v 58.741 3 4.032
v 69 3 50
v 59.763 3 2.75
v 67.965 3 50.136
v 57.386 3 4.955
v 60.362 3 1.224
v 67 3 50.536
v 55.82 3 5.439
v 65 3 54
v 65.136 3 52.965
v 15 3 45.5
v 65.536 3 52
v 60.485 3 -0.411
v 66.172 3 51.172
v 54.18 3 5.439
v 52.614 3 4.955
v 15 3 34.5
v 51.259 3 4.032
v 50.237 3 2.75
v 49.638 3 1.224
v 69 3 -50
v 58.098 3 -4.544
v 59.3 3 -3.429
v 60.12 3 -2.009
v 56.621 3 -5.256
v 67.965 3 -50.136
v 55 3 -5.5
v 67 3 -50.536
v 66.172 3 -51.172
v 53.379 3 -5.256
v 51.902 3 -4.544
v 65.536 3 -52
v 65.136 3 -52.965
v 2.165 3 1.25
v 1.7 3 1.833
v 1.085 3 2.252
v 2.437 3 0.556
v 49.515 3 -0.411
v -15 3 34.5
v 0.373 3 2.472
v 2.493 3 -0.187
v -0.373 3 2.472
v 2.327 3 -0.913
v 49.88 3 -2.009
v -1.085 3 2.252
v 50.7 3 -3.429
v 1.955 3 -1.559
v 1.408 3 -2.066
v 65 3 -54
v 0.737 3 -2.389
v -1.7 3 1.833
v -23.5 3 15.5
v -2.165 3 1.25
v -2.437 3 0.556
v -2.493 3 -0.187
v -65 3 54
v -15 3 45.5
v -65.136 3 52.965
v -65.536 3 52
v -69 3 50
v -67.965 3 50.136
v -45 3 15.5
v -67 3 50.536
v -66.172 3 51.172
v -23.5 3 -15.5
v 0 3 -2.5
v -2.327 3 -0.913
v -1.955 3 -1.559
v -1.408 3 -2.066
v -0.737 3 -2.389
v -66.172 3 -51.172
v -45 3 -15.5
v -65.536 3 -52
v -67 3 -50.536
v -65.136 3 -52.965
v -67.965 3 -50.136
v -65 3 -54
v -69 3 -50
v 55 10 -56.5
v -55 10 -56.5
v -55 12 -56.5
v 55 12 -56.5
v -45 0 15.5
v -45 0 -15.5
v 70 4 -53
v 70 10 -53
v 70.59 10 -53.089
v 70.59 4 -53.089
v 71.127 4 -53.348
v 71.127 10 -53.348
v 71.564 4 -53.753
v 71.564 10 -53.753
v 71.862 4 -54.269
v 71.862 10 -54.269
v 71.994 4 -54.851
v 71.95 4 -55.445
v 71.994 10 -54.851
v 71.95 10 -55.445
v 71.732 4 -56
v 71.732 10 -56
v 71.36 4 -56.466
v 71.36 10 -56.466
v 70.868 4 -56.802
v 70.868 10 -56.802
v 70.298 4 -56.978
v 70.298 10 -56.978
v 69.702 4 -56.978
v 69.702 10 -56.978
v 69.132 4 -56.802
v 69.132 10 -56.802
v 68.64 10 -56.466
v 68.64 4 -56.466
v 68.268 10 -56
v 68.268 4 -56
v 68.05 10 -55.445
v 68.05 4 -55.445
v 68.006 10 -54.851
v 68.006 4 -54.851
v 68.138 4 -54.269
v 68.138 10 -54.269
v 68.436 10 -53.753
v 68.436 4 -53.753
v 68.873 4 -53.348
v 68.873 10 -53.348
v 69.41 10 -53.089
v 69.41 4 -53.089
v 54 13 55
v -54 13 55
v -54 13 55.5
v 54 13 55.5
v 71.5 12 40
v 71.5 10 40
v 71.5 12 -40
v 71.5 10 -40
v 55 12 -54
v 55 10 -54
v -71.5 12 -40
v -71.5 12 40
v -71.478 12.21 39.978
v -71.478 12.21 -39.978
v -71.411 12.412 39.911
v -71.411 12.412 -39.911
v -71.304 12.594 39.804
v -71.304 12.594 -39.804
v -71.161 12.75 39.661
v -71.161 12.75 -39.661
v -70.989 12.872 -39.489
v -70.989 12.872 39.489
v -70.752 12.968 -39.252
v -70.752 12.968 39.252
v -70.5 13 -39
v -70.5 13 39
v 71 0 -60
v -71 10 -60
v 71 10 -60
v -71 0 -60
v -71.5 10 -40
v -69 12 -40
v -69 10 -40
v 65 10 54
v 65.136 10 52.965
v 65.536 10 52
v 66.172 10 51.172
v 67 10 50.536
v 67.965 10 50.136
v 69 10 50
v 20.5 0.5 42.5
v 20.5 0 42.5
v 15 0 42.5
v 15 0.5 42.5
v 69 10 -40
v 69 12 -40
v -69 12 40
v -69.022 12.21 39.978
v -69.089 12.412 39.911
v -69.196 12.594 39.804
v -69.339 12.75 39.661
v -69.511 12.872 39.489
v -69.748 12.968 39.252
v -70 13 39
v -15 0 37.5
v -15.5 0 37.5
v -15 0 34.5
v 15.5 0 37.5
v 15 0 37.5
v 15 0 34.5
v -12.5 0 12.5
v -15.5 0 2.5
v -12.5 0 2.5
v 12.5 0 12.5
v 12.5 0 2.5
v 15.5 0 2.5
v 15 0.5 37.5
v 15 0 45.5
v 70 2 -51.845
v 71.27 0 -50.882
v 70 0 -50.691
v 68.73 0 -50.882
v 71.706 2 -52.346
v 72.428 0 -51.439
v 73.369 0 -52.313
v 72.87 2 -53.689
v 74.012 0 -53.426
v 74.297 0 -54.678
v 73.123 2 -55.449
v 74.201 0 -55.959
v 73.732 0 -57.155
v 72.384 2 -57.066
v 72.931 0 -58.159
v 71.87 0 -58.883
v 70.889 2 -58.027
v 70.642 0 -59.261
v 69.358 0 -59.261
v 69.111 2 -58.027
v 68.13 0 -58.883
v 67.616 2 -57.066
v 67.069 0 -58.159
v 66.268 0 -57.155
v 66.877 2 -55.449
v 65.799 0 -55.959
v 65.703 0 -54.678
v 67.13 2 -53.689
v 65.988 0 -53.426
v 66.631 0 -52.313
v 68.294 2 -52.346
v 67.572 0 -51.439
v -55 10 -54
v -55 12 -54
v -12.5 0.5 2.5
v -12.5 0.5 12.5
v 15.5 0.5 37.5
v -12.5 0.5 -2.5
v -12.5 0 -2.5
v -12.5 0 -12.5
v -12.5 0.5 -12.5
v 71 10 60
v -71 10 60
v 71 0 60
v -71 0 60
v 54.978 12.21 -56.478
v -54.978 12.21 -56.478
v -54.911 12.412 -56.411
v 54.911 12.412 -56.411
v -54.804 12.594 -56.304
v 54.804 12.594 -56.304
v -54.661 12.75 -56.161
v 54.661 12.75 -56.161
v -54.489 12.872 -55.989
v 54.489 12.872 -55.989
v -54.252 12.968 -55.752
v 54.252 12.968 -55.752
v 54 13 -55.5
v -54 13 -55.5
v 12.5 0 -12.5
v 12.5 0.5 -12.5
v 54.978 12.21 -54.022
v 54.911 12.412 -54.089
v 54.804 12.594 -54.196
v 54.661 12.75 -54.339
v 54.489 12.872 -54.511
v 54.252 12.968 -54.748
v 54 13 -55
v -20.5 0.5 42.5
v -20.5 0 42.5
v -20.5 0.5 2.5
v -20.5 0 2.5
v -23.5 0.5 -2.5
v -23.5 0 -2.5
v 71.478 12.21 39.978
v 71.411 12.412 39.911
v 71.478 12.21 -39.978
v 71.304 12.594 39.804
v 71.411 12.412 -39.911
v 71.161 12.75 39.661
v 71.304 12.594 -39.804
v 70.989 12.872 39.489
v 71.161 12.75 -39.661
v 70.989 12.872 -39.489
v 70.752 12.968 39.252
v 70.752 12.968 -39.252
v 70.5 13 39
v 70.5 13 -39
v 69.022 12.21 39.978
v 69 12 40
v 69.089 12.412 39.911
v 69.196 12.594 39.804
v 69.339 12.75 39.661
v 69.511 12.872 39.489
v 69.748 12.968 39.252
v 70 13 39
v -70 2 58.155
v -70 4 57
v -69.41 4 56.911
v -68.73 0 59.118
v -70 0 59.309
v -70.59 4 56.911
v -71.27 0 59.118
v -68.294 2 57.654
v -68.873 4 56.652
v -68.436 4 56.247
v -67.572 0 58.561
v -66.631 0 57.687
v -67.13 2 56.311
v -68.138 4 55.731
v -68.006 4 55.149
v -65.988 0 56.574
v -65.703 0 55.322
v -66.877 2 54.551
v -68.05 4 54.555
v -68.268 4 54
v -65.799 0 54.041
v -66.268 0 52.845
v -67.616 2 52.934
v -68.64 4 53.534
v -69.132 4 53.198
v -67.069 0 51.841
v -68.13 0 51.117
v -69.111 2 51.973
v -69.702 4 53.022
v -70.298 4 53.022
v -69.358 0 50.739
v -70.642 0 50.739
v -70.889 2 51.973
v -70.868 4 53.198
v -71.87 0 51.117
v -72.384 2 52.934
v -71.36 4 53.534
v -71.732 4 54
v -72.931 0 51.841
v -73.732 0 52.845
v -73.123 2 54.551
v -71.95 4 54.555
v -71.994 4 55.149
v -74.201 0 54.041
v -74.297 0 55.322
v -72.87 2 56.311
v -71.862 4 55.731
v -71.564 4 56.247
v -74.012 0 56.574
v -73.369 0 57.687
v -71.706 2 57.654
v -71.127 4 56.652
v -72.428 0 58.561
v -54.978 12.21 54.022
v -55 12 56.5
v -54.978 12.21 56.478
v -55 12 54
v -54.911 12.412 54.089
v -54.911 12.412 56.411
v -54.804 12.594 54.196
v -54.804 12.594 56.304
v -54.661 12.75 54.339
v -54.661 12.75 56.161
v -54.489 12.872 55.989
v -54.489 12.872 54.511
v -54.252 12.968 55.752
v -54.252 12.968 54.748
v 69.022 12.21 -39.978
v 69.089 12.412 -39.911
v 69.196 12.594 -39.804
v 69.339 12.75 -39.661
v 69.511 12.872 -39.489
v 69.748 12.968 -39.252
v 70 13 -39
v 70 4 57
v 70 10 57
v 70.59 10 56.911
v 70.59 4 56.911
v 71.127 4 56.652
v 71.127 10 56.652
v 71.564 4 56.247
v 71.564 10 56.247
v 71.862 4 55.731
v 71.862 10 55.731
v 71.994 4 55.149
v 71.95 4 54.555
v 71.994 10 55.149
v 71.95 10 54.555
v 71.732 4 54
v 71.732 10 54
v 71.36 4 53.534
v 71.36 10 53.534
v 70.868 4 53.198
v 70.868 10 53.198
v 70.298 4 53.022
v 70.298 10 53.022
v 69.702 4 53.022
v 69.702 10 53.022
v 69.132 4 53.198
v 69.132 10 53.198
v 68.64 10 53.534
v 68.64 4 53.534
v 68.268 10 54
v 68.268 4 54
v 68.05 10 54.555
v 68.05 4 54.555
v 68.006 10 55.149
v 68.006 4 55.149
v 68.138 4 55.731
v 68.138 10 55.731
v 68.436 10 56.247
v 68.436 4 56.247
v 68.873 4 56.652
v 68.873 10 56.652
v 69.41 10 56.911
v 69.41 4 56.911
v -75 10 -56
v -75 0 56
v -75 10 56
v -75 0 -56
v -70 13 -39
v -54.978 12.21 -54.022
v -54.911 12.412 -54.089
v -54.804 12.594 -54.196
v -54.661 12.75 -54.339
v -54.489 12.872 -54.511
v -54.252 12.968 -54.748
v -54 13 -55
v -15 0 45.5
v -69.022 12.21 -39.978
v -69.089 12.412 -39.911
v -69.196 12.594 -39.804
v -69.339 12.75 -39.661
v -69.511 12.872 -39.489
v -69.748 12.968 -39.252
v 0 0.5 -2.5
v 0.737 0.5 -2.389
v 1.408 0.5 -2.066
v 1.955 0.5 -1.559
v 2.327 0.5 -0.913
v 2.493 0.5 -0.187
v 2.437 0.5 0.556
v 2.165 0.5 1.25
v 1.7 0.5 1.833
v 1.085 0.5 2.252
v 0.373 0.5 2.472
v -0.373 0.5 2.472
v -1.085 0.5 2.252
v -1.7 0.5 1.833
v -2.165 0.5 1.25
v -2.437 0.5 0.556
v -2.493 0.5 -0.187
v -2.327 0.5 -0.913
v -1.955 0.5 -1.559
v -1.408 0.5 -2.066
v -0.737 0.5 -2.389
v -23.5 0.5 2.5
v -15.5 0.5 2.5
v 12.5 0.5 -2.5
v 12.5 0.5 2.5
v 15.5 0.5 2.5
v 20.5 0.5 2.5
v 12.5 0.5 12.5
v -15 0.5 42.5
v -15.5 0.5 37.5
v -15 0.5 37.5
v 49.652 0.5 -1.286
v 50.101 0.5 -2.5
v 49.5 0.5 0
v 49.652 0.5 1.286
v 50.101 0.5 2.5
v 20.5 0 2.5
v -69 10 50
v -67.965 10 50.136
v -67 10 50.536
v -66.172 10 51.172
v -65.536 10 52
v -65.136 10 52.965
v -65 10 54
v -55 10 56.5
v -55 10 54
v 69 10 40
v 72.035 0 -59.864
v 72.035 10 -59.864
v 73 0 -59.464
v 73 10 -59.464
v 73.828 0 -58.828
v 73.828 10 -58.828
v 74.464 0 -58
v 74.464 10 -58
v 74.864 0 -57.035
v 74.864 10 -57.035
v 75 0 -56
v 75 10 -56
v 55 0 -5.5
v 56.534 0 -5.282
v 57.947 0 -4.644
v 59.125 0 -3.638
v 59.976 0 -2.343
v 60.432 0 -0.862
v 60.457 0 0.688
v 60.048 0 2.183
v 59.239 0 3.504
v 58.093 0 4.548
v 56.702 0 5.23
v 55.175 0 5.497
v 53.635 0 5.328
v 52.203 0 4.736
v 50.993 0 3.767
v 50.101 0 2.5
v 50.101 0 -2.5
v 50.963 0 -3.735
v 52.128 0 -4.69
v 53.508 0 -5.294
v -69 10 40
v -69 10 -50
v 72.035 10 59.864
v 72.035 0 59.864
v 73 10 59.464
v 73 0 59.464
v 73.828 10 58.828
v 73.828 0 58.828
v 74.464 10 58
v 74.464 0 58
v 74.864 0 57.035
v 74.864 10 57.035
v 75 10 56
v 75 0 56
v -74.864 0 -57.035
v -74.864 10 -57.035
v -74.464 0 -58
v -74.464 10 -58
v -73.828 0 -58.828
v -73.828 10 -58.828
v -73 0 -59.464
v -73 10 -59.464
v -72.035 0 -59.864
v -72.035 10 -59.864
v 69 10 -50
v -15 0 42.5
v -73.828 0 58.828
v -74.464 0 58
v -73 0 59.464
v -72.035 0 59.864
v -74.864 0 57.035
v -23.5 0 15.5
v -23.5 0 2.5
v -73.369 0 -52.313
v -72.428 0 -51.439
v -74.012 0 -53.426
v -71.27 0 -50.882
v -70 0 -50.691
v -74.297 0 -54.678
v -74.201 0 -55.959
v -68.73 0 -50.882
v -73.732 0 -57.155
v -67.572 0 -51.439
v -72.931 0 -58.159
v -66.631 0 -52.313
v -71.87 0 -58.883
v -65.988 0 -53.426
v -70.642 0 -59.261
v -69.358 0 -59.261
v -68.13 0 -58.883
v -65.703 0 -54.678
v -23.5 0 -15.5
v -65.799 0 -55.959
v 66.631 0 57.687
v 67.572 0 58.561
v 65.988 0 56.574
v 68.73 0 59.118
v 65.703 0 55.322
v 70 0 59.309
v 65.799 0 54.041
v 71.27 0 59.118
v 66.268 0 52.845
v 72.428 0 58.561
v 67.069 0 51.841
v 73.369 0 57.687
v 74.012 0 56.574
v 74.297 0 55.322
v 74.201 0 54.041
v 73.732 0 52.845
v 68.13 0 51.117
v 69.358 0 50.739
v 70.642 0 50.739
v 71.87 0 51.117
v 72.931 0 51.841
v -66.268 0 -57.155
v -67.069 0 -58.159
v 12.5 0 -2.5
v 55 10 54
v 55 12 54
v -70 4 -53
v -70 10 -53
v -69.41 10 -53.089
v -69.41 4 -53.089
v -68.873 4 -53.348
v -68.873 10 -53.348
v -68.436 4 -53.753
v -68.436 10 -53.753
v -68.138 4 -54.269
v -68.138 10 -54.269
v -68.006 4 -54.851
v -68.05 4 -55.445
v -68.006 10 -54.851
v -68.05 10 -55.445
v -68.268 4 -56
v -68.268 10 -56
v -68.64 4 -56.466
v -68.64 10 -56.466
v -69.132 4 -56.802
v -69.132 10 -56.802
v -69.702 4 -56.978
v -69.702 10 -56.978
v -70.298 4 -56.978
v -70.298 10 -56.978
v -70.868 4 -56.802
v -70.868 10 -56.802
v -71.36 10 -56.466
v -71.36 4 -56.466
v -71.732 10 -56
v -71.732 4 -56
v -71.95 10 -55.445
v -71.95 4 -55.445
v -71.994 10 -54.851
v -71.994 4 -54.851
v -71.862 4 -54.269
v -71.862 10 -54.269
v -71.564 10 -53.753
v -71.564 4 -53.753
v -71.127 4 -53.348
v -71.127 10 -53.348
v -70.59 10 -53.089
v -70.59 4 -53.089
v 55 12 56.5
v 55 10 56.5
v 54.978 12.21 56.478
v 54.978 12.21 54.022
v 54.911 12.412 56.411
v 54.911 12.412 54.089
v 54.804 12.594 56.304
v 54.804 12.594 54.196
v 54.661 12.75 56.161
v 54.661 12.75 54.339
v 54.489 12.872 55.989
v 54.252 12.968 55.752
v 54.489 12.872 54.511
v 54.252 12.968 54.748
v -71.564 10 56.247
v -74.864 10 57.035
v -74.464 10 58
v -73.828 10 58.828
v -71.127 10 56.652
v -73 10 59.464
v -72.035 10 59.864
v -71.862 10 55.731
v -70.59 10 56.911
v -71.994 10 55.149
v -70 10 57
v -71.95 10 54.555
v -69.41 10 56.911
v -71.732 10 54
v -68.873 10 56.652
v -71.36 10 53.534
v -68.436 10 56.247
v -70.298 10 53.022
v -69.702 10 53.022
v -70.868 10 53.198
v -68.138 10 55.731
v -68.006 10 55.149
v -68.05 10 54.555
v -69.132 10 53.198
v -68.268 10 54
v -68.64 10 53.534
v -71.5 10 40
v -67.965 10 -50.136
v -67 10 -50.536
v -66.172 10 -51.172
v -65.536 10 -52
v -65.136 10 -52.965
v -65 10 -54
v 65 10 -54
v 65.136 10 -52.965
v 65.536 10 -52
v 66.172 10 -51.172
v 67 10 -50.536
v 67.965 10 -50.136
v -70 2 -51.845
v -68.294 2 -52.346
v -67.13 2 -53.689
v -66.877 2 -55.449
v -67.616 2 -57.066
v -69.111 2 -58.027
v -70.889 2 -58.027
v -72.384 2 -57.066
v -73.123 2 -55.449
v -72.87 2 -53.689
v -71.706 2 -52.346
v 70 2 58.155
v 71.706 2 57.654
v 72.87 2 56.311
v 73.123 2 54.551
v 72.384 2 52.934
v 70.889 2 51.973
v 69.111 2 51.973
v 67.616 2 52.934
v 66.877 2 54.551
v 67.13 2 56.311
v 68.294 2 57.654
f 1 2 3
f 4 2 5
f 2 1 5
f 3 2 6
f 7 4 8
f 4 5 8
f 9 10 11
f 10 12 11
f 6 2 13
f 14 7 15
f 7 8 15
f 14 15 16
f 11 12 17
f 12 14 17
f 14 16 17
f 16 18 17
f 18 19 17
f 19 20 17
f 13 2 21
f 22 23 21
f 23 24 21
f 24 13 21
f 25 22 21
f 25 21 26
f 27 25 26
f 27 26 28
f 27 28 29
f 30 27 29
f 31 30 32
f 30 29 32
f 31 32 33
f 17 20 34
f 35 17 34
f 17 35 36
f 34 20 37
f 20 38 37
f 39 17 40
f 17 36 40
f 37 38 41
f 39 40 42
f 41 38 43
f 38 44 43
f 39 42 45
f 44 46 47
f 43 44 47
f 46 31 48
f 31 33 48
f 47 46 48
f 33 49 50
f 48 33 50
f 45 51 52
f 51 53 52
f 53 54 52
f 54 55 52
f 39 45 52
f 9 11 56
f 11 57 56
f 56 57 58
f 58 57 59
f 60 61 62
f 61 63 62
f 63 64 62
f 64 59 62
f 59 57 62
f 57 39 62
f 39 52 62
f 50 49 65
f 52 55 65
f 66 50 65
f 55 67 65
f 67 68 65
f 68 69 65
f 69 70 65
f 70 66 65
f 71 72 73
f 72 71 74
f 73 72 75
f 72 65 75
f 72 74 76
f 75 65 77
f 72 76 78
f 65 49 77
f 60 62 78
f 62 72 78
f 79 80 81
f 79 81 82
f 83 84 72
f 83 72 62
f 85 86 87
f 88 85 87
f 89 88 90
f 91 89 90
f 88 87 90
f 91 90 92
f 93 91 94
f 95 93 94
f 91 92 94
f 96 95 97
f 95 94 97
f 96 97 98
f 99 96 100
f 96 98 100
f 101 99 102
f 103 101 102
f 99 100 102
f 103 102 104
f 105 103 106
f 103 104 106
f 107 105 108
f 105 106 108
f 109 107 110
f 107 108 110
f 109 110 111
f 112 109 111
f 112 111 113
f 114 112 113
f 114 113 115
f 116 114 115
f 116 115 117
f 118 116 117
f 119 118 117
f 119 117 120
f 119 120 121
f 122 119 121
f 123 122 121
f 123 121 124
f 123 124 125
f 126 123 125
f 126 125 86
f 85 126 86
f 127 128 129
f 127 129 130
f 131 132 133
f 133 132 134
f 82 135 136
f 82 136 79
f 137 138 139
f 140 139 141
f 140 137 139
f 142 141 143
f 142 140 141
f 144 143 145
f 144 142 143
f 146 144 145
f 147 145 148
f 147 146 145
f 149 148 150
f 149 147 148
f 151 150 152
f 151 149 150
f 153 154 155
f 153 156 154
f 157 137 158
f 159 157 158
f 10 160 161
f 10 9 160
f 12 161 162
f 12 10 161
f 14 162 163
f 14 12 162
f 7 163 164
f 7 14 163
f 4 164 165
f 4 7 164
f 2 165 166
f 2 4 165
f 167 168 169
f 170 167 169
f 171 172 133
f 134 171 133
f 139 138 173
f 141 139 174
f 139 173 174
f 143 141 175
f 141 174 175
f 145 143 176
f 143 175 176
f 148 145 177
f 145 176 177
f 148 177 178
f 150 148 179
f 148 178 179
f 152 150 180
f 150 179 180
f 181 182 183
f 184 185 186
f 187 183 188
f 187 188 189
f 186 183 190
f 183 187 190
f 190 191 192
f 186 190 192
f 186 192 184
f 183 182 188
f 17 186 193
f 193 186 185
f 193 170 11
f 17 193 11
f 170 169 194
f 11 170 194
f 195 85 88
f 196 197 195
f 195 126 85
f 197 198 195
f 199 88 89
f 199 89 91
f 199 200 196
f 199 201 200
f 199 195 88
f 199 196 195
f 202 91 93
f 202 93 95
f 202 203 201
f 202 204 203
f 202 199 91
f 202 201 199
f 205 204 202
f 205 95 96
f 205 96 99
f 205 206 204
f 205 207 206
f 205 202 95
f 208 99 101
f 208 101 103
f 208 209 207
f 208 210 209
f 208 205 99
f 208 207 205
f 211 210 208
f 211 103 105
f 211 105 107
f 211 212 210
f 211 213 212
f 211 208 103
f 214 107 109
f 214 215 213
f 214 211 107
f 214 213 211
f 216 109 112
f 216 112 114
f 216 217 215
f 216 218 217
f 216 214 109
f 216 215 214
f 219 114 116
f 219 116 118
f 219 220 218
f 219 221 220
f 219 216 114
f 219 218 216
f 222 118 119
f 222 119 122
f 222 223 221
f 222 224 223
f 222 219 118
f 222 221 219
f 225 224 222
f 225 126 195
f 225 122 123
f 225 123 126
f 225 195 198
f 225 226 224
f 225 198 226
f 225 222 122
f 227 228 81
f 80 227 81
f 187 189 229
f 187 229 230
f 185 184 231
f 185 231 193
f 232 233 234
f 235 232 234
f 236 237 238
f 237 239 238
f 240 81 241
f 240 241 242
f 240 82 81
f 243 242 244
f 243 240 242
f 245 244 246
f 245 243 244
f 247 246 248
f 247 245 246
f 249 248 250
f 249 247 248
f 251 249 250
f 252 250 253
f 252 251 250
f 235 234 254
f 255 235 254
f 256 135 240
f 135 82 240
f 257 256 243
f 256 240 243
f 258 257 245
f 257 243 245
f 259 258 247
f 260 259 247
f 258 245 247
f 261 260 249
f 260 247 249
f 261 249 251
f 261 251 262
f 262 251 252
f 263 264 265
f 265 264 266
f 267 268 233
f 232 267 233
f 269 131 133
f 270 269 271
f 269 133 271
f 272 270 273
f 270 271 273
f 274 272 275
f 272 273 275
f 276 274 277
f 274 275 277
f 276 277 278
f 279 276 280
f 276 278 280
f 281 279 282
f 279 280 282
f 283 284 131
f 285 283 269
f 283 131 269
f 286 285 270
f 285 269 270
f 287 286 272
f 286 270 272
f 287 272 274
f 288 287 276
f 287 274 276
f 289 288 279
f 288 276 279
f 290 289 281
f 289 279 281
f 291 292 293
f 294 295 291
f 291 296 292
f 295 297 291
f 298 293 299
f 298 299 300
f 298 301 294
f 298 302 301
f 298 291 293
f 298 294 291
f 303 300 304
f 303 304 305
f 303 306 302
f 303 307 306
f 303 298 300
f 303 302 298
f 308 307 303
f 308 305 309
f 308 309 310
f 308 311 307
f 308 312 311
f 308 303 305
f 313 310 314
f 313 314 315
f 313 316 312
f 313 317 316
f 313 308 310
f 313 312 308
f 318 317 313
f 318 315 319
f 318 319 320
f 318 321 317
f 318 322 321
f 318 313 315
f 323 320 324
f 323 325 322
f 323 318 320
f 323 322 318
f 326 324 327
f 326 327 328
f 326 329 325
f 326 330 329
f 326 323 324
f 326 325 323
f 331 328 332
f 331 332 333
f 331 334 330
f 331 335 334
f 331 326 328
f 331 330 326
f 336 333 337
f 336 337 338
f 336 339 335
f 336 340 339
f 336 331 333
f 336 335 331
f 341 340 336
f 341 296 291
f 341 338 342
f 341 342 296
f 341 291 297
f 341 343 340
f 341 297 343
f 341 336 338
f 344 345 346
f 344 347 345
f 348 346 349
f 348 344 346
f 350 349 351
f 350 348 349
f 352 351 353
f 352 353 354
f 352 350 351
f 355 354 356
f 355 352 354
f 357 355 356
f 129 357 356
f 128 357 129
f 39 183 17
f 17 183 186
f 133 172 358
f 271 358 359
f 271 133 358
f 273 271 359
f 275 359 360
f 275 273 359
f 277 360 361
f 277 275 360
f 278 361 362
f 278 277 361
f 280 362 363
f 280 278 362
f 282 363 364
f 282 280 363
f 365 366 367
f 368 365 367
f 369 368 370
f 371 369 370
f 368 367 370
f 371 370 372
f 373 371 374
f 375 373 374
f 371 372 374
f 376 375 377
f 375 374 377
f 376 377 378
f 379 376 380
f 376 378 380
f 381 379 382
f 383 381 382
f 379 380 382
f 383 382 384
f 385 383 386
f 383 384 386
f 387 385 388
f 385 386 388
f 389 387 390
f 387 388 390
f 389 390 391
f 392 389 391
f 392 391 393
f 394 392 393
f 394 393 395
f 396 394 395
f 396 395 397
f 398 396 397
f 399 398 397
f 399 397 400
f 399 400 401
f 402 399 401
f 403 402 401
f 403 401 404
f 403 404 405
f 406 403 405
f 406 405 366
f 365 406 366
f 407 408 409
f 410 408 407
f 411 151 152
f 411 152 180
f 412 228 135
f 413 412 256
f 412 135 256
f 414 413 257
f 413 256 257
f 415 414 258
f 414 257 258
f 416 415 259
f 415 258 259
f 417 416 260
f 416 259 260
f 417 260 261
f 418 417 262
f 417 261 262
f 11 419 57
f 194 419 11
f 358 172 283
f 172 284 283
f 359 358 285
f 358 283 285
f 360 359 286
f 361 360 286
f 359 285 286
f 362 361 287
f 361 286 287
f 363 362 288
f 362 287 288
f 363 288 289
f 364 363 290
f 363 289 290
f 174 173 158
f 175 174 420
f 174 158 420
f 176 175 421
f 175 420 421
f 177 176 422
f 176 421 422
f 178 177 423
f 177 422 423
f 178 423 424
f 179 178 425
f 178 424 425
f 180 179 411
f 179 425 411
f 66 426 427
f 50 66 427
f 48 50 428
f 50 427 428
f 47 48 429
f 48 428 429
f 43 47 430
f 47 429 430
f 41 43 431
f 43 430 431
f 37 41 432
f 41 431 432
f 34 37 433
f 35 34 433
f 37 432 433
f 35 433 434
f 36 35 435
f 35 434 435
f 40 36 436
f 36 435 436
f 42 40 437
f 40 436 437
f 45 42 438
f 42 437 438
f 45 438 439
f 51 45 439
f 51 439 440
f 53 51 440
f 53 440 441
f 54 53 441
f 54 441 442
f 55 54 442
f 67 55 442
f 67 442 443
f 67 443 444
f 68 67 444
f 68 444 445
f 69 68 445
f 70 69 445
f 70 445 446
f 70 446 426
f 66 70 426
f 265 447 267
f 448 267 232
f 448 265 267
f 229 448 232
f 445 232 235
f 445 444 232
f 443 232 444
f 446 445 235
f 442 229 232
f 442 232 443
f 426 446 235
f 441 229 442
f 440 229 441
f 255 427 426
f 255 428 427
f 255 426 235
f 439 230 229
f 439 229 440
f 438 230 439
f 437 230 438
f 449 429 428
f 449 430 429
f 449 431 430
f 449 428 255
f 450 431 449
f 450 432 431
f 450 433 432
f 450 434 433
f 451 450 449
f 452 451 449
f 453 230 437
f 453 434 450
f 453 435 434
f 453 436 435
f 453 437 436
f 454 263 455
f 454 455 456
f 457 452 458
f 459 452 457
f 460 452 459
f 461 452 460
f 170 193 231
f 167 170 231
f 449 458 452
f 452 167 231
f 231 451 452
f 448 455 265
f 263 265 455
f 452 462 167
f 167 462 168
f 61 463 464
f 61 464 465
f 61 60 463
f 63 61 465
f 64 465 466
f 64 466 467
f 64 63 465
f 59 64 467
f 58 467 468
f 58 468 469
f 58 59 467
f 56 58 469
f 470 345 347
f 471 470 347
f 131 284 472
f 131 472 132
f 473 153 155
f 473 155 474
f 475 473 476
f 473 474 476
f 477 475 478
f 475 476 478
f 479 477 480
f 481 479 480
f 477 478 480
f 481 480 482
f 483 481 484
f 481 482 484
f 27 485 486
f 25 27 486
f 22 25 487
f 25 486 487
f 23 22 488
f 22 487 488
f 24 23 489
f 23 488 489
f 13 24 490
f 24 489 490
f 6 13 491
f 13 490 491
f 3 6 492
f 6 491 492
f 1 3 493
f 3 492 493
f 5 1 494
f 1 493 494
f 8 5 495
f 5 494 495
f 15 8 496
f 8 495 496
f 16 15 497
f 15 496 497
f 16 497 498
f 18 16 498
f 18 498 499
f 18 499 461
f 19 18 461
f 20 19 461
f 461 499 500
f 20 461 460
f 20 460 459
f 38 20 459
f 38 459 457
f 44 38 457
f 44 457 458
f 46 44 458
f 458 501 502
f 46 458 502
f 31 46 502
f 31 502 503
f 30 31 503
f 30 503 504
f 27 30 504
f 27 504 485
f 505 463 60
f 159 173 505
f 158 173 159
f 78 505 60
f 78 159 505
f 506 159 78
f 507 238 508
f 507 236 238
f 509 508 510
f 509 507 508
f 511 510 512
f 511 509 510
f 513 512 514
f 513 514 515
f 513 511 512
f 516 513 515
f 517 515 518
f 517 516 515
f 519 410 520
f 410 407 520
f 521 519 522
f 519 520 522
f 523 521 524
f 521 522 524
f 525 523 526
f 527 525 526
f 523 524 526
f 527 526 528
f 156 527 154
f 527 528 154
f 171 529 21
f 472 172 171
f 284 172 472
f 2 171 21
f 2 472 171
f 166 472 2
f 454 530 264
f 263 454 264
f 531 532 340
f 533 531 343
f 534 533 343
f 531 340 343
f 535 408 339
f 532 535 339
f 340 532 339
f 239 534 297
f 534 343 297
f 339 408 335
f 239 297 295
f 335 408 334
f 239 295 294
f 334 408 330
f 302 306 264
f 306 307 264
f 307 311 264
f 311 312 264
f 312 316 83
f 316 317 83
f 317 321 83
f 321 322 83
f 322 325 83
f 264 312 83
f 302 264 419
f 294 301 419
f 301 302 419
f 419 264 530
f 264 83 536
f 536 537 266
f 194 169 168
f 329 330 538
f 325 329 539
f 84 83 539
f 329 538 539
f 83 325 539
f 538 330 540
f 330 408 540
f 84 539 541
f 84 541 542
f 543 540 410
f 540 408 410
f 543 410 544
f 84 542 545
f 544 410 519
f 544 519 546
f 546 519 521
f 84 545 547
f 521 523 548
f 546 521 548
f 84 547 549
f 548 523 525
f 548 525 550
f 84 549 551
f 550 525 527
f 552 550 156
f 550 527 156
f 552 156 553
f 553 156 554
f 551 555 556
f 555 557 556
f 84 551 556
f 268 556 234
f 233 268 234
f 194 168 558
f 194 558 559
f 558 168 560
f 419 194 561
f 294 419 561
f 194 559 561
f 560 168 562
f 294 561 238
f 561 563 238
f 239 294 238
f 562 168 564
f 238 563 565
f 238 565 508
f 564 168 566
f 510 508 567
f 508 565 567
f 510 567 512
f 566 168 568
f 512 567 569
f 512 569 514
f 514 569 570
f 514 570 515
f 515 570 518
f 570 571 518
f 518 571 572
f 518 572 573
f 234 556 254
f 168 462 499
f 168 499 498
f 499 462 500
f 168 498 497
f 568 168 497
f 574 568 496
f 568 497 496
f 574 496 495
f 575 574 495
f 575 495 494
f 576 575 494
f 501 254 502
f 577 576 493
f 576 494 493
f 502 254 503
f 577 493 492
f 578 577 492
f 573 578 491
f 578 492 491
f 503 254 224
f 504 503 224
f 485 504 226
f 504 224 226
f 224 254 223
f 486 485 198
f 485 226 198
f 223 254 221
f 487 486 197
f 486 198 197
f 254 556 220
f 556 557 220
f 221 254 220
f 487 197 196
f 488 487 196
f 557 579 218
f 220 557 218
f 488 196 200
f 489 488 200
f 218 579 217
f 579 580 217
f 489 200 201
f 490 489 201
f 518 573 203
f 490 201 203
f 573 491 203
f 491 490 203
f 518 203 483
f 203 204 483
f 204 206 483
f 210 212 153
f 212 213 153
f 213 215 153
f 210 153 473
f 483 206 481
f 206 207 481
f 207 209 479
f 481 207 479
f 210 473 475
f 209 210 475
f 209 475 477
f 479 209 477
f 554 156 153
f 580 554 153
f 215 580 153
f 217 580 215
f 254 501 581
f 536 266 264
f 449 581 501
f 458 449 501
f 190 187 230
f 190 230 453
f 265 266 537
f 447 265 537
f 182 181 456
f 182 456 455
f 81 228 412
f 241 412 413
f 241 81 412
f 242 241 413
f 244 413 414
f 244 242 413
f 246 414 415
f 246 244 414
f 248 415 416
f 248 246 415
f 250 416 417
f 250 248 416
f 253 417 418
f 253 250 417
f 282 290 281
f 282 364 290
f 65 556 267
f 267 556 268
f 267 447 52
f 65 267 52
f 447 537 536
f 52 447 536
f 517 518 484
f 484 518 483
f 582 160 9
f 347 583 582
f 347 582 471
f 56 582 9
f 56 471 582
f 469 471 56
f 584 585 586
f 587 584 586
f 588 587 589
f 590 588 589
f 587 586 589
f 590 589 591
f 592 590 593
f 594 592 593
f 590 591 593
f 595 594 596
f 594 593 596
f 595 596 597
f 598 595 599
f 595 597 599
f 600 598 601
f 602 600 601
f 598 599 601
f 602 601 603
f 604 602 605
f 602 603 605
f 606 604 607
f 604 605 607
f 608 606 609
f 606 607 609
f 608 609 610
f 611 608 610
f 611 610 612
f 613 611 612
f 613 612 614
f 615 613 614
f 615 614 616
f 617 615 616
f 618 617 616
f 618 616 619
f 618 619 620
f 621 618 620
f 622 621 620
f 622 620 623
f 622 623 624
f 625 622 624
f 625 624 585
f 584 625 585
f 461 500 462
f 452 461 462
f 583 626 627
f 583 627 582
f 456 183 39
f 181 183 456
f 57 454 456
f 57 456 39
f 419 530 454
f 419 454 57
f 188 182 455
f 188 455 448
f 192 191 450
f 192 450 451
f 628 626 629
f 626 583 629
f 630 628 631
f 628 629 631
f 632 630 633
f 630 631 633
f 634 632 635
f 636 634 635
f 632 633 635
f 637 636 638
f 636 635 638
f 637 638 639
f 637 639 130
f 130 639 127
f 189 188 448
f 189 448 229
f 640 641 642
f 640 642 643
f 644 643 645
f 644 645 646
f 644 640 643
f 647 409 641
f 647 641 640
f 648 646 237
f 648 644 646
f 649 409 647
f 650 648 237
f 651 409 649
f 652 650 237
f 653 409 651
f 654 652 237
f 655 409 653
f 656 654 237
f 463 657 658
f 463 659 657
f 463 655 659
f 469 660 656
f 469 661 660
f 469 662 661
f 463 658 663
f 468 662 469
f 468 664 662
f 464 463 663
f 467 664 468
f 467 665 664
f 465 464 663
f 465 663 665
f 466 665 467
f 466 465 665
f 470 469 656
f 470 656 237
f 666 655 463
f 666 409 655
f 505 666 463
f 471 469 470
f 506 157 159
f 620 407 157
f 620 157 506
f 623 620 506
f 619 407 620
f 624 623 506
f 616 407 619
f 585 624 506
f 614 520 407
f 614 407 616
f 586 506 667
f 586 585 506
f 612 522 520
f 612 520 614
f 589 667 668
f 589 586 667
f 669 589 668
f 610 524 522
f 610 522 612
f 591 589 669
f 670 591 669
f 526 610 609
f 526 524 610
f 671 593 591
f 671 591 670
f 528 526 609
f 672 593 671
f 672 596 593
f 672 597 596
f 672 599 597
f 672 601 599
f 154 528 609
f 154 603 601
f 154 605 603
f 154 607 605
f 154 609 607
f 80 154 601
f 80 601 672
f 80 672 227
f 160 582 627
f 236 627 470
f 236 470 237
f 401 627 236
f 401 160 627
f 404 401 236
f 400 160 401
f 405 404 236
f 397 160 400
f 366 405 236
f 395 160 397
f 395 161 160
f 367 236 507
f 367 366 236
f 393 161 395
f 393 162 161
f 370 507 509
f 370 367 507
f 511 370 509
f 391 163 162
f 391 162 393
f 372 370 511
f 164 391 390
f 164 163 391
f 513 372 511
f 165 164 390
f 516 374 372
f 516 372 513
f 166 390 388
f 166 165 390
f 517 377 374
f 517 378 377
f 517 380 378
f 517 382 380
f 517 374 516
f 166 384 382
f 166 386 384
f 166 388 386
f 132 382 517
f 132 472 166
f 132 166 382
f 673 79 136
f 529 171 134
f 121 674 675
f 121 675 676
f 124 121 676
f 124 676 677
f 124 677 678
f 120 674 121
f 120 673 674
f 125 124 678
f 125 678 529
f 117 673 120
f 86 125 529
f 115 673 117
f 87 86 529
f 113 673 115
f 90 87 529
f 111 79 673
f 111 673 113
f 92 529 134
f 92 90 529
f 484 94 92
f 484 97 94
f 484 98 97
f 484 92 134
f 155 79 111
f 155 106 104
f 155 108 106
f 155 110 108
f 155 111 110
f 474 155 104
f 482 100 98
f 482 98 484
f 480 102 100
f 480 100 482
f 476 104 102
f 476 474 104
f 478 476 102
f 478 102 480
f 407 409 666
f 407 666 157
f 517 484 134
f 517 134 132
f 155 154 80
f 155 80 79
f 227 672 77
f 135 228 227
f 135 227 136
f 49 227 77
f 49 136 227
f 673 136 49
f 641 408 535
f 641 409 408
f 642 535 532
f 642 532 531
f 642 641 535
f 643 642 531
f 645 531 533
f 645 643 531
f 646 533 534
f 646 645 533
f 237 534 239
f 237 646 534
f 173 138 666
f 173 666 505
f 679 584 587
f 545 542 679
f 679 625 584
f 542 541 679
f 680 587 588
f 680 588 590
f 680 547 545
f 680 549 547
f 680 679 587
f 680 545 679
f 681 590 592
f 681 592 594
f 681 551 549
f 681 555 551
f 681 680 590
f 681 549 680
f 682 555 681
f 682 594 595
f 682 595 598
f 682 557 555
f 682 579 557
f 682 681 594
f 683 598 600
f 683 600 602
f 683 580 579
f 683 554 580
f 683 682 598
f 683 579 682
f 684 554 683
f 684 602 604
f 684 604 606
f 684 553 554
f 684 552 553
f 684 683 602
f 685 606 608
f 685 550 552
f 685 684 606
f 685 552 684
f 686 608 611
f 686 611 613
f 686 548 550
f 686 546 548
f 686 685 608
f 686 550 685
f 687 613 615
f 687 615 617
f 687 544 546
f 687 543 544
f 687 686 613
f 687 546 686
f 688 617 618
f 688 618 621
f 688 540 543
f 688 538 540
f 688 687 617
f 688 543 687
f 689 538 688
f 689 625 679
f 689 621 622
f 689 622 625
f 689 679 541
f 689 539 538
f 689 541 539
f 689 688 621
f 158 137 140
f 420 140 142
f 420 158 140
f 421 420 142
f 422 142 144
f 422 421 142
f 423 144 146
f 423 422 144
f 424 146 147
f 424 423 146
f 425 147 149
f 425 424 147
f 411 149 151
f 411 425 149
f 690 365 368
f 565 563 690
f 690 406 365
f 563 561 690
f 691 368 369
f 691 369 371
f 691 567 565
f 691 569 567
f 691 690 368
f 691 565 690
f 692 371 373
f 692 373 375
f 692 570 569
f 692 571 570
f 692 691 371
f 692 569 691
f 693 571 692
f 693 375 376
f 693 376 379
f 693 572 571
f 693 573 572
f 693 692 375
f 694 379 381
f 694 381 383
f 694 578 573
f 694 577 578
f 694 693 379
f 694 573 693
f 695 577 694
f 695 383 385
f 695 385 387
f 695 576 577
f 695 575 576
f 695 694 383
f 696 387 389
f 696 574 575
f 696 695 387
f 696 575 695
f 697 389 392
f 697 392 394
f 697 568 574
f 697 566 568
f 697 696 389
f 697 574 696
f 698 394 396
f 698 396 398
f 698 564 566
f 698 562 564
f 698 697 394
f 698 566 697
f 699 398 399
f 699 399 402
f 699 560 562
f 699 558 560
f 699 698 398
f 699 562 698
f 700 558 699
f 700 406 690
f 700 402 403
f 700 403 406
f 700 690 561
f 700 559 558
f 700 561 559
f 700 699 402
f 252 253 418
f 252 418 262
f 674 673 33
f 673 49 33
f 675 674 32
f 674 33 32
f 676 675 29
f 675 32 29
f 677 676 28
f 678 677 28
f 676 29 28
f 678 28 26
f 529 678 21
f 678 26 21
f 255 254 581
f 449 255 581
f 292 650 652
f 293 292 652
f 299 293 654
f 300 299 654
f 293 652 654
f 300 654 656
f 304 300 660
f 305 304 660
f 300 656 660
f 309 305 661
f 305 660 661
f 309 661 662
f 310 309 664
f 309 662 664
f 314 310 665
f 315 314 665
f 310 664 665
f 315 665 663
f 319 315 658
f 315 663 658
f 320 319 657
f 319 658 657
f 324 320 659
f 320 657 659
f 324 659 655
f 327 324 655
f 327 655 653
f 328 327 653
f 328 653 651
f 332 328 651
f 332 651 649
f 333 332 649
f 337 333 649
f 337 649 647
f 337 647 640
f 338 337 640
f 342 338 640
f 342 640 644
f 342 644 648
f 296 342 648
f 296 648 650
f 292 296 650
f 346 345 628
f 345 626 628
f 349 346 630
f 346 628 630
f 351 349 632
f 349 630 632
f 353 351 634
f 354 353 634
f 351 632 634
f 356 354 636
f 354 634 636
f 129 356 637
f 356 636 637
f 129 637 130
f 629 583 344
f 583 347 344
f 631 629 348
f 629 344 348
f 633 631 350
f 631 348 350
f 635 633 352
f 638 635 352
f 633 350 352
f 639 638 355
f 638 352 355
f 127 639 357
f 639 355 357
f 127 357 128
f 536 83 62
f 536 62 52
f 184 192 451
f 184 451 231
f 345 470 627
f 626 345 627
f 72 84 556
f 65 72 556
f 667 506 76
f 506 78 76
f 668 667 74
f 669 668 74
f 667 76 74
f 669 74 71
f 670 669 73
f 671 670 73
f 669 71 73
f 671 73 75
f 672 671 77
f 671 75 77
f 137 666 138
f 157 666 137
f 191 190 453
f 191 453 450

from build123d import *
from OCP.BRepFilletAPI import BRepFilletAPI_MakeChamfer

# Parameters (mm, degrees)
CROQUIS1_W              = 150
CROQUIS1_H              = 120
SALIENTE_EXTRUIR1_DEPTH = 10
CROQUIS2_W              = 143
CROQUIS2_H              = 113
SALIENTE_EXTRUIR2_DEPTH = 3
CORTAR_EXTRUIR4_DEPTH   = 10
CROQUIS5_W              = 20
CROQUIS5_H              = 20
CORTAR_EXTRUIR5_DEPTH   = 3
CROQUIS7_R              = 2
CORTAR_EXTRUIR6_DEPTH   = 97.566039579
CHAFL_N1_SIZE           = 4
CHAFL_N1_SIZE2          = 2.309401077
REDONDEO3_R             = 4
REDONDEO4_R             = 4
REDONDEO5_R             = 1
CROQUIS8_R              = 2.5
CROQUIS8_R_2            = 5.5
CROQUIS8_W              = 21.5
CROQUIS8_H              = 31
CROQUIS8_W_2            = 30
CROQUIS8_H_2            = 11
CORTAR_EXTRUIR7_DEPTH   = 97.922649572
CORTAR_EXTRUIR8_DEPTH   = 0.5


with BuildPart() as part:
    # Croquis1 → Saliente-Extruir1 (new body)
    with BuildSketch(Plane(origin=(0, 0, 0), x_dir=(1, 0, 0), z_dir=(0, 1, 0))):
        Rectangle(CROQUIS1_W, CROQUIS1_H)
    extrude(amount=SALIENTE_EXTRUIR1_DEPTH)

    # Croquis2 → Saliente-Extruir2 (add)
    with BuildSketch(Plane(origin=(0, 10, 0), x_dir=(1, 0, 0), z_dir=(0, 1, 0))):
        Rectangle(CROQUIS2_W, CROQUIS2_H)
    extrude(amount=SALIENTE_EXTRUIR2_DEPTH)

    # Croquis4 → Cortar-Extruir4 (cut)
    with BuildSketch(Plane(origin=(0, 13, 0), x_dir=(1, 0, 0), z_dir=(0, 1, 0))):
        Polygon((-65, 54), (65, 54), (65, 50), (69, 50), (69, -50), (65, -50), (65, -54), (-65, -54), (-65, -50), (-69, -50), (-69, 50), (-65, 50), align=None)
    extrude(amount=-CORTAR_EXTRUIR4_DEPTH, mode=Mode.SUBTRACT)

    # Croquis5 → Cortar-Extruir5 (cut)
    with BuildSketch(Plane(origin=(0, 13, 0), x_dir=(1, 0, 0), z_dir=(0, 1, 0))):
        with Locations((-65, 50)):
            Rectangle(CROQUIS5_W, CROQUIS5_H)
        with Locations((65, 50)):
            Rectangle(CROQUIS5_W, CROQUIS5_H)
        with Locations((65, -50)):
            Rectangle(CROQUIS5_W, CROQUIS5_H)
        with Locations((-65, -50)):
            Rectangle(CROQUIS5_W, CROQUIS5_H)
    extrude(amount=-CORTAR_EXTRUIR5_DEPTH, mode=Mode.SUBTRACT)

    # Croquis7 → Cortar-Extruir6 (cut, through all)
    with BuildSketch(Plane(origin=(0, 10, 0), x_dir=(1, 0, 0), z_dir=(0, 1, 0))):
        with Locations(Location((-70, 55, 0), (0, 0, 270))):
            Circle(CROQUIS7_R)
        with Locations(Location((70, 55, 0), (0, 0, 270))):
            Circle(CROQUIS7_R)
        with Locations(Location((70, -55, 0), (0, 0, 270))):
            Circle(CROQUIS7_R)
        with Locations(Location((-70, -55, 0), (0, 0, 270))):
            Circle(CROQUIS7_R)
    extrude(amount=-CORTAR_EXTRUIR6_DEPTH, mode=Mode.SUBTRACT)

    # Chaflán1: one chamfer whose edges measure the first distance from different faces: ONE call of the kernel's chamfer builder (chamfer() names one face for all edges)
    chafl_n1_edges_1 = [part.edges().sort_by_distance(p)[0] for p in [
        (70, 0, 53),
    ]]
    chafl_n1_side_1 = [part.faces().sort_by_distance(p)[0] for p in [
        (70, 5, 53),
    ]]
    chafl_n1_edges_2 = [part.edges().sort_by_distance(p)[0] for p in [
        (-70, 0, -57),
    ]]
    chafl_n1_side_2 = [part.faces().sort_by_distance(p)[0] for p in [
        (-70, 5, -57),
    ]]
    chafl_n1_edges_3 = [part.edges().sort_by_distance(p)[0] for p in [
        (-70, 0, 53),
    ]]
    chafl_n1_side_3 = [part.faces().sort_by_distance(p)[0] for p in [
        (-70, 5, 53),
    ]]
    chafl_n1_edges_4 = [part.edges().sort_by_distance(p)[0] for p in [
        (70, 0, -57),
    ]]
    chafl_n1_side_4 = [part.faces().sort_by_distance(p)[0] for p in [
        (70, 5, -57),
    ]]
    chafl_n1 = BRepFilletAPI_MakeChamfer(part.part.solid().wrapped)
    for e in chafl_n1_edges_1:
        chafl_n1.Add(CHAFL_N1_SIZE, CHAFL_N1_SIZE2, e.wrapped, chafl_n1_side_1[0].wrapped)  # the first distance lies on this face
    for e in chafl_n1_edges_2:
        chafl_n1.Add(CHAFL_N1_SIZE, CHAFL_N1_SIZE2, e.wrapped, chafl_n1_side_2[0].wrapped)  # the first distance lies on this face
    for e in chafl_n1_edges_3:
        chafl_n1.Add(CHAFL_N1_SIZE, CHAFL_N1_SIZE2, e.wrapped, chafl_n1_side_3[0].wrapped)  # the first distance lies on this face
    for e in chafl_n1_edges_4:
        chafl_n1.Add(CHAFL_N1_SIZE, CHAFL_N1_SIZE2, e.wrapped, chafl_n1_side_4[0].wrapped)  # the first distance lies on this face
    add(Compound.cast(chafl_n1.Shape()), mode=Mode.REPLACE)

    # Redondeo3
    redondeo3_edges = [part.edges().sort_by_distance(p)[0] for p in [
        (75, 5, 60),
        (-75, 5, 60),
        (-75, 5, -60),
        (75, 5, -60),
    ]]
    fillet(redondeo3_edges, radius=REDONDEO3_R)

    # Redondeo4
    redondeo4_edges = [part.edges().sort_by_distance(p)[0] for p in [
        (65, 6.5, -50),
        (65, 6.5, 50),
        (-65, 6.5, 50),
        (-65, 6.5, -50),
    ]]
    fillet(redondeo4_edges, radius=REDONDEO4_R - 0.0001)  # a hair under: the kernel refuses the full size

    # Redondeo5
    redondeo5_edges = [part.edges().sort_by_distance(p)[0] for p in [
        (70.25, 13, 40),
        (55, 13, 55.25),
        (55, 13, -55.25),
        (70.25, 13, -40),
        (-55, 13, -55.25),
        (-70.25, 13, -40),
        (0, 13, -54),
        (69, 13, 0),
        (0, 13, 54),
        (-69, 13, 0),
        (71.5, 13, 0),
        (0, 13, -56.5),
        (-71.5, 13, 0),
        (0, 13, 56.5),
        (-55, 13, 55.25),
        (-70.25, 13, 40),
    ]]
    fillet(redondeo5_edges, radius=REDONDEO5_R)

    # Croquis8 → Cortar-Extruir7 (cut, through all)
    with BuildSketch(Plane.XZ):
        with Locations(Location((0, 0, 0), (0, 0, 270))):
            Circle(CROQUIS8_R)
        with Locations(Location((55, 0, 0), (0, 0, 270))):
            Circle(CROQUIS8_R_2)
        with Locations((-34.25, 0)):
            Rectangle(CROQUIS8_W, CROQUIS8_H)
        with Locations((0, 40)):
            Rectangle(CROQUIS8_W_2, CROQUIS8_H_2)
    extrude(amount=-CORTAR_EXTRUIR7_DEPTH, mode=Mode.SUBTRACT)

    # Croquis9 → Cortar-Extruir8 (cut)
    with BuildSketch(Plane.XZ):
        Polygon((-23.5, 2.5), (-23.5, -2.5), (-12.5, -2.5), (-12.5, -12.5), (12.5, -12.5), (12.5, -2.5), (50.101020514, -2.5), (50.101020514, 2.5), (20.5, 2.5), (20.5, 42.5), (-20.5, 42.5), (-20.5, 2.5), align=None)
        Polygon((-12.5, 2.5), (-12.5, 12.5), (12.5, 12.5), (12.5, 2.5), (15.5, 2.5), (15.5, 37.5), (-15.5, 37.5), (-15.5, 2.5), align=None, mode=Mode.SUBTRACT)
    extrude(amount=-CORTAR_EXTRUIR8_DEPTH, mode=Mode.SUBTRACT)


solid = part.part
